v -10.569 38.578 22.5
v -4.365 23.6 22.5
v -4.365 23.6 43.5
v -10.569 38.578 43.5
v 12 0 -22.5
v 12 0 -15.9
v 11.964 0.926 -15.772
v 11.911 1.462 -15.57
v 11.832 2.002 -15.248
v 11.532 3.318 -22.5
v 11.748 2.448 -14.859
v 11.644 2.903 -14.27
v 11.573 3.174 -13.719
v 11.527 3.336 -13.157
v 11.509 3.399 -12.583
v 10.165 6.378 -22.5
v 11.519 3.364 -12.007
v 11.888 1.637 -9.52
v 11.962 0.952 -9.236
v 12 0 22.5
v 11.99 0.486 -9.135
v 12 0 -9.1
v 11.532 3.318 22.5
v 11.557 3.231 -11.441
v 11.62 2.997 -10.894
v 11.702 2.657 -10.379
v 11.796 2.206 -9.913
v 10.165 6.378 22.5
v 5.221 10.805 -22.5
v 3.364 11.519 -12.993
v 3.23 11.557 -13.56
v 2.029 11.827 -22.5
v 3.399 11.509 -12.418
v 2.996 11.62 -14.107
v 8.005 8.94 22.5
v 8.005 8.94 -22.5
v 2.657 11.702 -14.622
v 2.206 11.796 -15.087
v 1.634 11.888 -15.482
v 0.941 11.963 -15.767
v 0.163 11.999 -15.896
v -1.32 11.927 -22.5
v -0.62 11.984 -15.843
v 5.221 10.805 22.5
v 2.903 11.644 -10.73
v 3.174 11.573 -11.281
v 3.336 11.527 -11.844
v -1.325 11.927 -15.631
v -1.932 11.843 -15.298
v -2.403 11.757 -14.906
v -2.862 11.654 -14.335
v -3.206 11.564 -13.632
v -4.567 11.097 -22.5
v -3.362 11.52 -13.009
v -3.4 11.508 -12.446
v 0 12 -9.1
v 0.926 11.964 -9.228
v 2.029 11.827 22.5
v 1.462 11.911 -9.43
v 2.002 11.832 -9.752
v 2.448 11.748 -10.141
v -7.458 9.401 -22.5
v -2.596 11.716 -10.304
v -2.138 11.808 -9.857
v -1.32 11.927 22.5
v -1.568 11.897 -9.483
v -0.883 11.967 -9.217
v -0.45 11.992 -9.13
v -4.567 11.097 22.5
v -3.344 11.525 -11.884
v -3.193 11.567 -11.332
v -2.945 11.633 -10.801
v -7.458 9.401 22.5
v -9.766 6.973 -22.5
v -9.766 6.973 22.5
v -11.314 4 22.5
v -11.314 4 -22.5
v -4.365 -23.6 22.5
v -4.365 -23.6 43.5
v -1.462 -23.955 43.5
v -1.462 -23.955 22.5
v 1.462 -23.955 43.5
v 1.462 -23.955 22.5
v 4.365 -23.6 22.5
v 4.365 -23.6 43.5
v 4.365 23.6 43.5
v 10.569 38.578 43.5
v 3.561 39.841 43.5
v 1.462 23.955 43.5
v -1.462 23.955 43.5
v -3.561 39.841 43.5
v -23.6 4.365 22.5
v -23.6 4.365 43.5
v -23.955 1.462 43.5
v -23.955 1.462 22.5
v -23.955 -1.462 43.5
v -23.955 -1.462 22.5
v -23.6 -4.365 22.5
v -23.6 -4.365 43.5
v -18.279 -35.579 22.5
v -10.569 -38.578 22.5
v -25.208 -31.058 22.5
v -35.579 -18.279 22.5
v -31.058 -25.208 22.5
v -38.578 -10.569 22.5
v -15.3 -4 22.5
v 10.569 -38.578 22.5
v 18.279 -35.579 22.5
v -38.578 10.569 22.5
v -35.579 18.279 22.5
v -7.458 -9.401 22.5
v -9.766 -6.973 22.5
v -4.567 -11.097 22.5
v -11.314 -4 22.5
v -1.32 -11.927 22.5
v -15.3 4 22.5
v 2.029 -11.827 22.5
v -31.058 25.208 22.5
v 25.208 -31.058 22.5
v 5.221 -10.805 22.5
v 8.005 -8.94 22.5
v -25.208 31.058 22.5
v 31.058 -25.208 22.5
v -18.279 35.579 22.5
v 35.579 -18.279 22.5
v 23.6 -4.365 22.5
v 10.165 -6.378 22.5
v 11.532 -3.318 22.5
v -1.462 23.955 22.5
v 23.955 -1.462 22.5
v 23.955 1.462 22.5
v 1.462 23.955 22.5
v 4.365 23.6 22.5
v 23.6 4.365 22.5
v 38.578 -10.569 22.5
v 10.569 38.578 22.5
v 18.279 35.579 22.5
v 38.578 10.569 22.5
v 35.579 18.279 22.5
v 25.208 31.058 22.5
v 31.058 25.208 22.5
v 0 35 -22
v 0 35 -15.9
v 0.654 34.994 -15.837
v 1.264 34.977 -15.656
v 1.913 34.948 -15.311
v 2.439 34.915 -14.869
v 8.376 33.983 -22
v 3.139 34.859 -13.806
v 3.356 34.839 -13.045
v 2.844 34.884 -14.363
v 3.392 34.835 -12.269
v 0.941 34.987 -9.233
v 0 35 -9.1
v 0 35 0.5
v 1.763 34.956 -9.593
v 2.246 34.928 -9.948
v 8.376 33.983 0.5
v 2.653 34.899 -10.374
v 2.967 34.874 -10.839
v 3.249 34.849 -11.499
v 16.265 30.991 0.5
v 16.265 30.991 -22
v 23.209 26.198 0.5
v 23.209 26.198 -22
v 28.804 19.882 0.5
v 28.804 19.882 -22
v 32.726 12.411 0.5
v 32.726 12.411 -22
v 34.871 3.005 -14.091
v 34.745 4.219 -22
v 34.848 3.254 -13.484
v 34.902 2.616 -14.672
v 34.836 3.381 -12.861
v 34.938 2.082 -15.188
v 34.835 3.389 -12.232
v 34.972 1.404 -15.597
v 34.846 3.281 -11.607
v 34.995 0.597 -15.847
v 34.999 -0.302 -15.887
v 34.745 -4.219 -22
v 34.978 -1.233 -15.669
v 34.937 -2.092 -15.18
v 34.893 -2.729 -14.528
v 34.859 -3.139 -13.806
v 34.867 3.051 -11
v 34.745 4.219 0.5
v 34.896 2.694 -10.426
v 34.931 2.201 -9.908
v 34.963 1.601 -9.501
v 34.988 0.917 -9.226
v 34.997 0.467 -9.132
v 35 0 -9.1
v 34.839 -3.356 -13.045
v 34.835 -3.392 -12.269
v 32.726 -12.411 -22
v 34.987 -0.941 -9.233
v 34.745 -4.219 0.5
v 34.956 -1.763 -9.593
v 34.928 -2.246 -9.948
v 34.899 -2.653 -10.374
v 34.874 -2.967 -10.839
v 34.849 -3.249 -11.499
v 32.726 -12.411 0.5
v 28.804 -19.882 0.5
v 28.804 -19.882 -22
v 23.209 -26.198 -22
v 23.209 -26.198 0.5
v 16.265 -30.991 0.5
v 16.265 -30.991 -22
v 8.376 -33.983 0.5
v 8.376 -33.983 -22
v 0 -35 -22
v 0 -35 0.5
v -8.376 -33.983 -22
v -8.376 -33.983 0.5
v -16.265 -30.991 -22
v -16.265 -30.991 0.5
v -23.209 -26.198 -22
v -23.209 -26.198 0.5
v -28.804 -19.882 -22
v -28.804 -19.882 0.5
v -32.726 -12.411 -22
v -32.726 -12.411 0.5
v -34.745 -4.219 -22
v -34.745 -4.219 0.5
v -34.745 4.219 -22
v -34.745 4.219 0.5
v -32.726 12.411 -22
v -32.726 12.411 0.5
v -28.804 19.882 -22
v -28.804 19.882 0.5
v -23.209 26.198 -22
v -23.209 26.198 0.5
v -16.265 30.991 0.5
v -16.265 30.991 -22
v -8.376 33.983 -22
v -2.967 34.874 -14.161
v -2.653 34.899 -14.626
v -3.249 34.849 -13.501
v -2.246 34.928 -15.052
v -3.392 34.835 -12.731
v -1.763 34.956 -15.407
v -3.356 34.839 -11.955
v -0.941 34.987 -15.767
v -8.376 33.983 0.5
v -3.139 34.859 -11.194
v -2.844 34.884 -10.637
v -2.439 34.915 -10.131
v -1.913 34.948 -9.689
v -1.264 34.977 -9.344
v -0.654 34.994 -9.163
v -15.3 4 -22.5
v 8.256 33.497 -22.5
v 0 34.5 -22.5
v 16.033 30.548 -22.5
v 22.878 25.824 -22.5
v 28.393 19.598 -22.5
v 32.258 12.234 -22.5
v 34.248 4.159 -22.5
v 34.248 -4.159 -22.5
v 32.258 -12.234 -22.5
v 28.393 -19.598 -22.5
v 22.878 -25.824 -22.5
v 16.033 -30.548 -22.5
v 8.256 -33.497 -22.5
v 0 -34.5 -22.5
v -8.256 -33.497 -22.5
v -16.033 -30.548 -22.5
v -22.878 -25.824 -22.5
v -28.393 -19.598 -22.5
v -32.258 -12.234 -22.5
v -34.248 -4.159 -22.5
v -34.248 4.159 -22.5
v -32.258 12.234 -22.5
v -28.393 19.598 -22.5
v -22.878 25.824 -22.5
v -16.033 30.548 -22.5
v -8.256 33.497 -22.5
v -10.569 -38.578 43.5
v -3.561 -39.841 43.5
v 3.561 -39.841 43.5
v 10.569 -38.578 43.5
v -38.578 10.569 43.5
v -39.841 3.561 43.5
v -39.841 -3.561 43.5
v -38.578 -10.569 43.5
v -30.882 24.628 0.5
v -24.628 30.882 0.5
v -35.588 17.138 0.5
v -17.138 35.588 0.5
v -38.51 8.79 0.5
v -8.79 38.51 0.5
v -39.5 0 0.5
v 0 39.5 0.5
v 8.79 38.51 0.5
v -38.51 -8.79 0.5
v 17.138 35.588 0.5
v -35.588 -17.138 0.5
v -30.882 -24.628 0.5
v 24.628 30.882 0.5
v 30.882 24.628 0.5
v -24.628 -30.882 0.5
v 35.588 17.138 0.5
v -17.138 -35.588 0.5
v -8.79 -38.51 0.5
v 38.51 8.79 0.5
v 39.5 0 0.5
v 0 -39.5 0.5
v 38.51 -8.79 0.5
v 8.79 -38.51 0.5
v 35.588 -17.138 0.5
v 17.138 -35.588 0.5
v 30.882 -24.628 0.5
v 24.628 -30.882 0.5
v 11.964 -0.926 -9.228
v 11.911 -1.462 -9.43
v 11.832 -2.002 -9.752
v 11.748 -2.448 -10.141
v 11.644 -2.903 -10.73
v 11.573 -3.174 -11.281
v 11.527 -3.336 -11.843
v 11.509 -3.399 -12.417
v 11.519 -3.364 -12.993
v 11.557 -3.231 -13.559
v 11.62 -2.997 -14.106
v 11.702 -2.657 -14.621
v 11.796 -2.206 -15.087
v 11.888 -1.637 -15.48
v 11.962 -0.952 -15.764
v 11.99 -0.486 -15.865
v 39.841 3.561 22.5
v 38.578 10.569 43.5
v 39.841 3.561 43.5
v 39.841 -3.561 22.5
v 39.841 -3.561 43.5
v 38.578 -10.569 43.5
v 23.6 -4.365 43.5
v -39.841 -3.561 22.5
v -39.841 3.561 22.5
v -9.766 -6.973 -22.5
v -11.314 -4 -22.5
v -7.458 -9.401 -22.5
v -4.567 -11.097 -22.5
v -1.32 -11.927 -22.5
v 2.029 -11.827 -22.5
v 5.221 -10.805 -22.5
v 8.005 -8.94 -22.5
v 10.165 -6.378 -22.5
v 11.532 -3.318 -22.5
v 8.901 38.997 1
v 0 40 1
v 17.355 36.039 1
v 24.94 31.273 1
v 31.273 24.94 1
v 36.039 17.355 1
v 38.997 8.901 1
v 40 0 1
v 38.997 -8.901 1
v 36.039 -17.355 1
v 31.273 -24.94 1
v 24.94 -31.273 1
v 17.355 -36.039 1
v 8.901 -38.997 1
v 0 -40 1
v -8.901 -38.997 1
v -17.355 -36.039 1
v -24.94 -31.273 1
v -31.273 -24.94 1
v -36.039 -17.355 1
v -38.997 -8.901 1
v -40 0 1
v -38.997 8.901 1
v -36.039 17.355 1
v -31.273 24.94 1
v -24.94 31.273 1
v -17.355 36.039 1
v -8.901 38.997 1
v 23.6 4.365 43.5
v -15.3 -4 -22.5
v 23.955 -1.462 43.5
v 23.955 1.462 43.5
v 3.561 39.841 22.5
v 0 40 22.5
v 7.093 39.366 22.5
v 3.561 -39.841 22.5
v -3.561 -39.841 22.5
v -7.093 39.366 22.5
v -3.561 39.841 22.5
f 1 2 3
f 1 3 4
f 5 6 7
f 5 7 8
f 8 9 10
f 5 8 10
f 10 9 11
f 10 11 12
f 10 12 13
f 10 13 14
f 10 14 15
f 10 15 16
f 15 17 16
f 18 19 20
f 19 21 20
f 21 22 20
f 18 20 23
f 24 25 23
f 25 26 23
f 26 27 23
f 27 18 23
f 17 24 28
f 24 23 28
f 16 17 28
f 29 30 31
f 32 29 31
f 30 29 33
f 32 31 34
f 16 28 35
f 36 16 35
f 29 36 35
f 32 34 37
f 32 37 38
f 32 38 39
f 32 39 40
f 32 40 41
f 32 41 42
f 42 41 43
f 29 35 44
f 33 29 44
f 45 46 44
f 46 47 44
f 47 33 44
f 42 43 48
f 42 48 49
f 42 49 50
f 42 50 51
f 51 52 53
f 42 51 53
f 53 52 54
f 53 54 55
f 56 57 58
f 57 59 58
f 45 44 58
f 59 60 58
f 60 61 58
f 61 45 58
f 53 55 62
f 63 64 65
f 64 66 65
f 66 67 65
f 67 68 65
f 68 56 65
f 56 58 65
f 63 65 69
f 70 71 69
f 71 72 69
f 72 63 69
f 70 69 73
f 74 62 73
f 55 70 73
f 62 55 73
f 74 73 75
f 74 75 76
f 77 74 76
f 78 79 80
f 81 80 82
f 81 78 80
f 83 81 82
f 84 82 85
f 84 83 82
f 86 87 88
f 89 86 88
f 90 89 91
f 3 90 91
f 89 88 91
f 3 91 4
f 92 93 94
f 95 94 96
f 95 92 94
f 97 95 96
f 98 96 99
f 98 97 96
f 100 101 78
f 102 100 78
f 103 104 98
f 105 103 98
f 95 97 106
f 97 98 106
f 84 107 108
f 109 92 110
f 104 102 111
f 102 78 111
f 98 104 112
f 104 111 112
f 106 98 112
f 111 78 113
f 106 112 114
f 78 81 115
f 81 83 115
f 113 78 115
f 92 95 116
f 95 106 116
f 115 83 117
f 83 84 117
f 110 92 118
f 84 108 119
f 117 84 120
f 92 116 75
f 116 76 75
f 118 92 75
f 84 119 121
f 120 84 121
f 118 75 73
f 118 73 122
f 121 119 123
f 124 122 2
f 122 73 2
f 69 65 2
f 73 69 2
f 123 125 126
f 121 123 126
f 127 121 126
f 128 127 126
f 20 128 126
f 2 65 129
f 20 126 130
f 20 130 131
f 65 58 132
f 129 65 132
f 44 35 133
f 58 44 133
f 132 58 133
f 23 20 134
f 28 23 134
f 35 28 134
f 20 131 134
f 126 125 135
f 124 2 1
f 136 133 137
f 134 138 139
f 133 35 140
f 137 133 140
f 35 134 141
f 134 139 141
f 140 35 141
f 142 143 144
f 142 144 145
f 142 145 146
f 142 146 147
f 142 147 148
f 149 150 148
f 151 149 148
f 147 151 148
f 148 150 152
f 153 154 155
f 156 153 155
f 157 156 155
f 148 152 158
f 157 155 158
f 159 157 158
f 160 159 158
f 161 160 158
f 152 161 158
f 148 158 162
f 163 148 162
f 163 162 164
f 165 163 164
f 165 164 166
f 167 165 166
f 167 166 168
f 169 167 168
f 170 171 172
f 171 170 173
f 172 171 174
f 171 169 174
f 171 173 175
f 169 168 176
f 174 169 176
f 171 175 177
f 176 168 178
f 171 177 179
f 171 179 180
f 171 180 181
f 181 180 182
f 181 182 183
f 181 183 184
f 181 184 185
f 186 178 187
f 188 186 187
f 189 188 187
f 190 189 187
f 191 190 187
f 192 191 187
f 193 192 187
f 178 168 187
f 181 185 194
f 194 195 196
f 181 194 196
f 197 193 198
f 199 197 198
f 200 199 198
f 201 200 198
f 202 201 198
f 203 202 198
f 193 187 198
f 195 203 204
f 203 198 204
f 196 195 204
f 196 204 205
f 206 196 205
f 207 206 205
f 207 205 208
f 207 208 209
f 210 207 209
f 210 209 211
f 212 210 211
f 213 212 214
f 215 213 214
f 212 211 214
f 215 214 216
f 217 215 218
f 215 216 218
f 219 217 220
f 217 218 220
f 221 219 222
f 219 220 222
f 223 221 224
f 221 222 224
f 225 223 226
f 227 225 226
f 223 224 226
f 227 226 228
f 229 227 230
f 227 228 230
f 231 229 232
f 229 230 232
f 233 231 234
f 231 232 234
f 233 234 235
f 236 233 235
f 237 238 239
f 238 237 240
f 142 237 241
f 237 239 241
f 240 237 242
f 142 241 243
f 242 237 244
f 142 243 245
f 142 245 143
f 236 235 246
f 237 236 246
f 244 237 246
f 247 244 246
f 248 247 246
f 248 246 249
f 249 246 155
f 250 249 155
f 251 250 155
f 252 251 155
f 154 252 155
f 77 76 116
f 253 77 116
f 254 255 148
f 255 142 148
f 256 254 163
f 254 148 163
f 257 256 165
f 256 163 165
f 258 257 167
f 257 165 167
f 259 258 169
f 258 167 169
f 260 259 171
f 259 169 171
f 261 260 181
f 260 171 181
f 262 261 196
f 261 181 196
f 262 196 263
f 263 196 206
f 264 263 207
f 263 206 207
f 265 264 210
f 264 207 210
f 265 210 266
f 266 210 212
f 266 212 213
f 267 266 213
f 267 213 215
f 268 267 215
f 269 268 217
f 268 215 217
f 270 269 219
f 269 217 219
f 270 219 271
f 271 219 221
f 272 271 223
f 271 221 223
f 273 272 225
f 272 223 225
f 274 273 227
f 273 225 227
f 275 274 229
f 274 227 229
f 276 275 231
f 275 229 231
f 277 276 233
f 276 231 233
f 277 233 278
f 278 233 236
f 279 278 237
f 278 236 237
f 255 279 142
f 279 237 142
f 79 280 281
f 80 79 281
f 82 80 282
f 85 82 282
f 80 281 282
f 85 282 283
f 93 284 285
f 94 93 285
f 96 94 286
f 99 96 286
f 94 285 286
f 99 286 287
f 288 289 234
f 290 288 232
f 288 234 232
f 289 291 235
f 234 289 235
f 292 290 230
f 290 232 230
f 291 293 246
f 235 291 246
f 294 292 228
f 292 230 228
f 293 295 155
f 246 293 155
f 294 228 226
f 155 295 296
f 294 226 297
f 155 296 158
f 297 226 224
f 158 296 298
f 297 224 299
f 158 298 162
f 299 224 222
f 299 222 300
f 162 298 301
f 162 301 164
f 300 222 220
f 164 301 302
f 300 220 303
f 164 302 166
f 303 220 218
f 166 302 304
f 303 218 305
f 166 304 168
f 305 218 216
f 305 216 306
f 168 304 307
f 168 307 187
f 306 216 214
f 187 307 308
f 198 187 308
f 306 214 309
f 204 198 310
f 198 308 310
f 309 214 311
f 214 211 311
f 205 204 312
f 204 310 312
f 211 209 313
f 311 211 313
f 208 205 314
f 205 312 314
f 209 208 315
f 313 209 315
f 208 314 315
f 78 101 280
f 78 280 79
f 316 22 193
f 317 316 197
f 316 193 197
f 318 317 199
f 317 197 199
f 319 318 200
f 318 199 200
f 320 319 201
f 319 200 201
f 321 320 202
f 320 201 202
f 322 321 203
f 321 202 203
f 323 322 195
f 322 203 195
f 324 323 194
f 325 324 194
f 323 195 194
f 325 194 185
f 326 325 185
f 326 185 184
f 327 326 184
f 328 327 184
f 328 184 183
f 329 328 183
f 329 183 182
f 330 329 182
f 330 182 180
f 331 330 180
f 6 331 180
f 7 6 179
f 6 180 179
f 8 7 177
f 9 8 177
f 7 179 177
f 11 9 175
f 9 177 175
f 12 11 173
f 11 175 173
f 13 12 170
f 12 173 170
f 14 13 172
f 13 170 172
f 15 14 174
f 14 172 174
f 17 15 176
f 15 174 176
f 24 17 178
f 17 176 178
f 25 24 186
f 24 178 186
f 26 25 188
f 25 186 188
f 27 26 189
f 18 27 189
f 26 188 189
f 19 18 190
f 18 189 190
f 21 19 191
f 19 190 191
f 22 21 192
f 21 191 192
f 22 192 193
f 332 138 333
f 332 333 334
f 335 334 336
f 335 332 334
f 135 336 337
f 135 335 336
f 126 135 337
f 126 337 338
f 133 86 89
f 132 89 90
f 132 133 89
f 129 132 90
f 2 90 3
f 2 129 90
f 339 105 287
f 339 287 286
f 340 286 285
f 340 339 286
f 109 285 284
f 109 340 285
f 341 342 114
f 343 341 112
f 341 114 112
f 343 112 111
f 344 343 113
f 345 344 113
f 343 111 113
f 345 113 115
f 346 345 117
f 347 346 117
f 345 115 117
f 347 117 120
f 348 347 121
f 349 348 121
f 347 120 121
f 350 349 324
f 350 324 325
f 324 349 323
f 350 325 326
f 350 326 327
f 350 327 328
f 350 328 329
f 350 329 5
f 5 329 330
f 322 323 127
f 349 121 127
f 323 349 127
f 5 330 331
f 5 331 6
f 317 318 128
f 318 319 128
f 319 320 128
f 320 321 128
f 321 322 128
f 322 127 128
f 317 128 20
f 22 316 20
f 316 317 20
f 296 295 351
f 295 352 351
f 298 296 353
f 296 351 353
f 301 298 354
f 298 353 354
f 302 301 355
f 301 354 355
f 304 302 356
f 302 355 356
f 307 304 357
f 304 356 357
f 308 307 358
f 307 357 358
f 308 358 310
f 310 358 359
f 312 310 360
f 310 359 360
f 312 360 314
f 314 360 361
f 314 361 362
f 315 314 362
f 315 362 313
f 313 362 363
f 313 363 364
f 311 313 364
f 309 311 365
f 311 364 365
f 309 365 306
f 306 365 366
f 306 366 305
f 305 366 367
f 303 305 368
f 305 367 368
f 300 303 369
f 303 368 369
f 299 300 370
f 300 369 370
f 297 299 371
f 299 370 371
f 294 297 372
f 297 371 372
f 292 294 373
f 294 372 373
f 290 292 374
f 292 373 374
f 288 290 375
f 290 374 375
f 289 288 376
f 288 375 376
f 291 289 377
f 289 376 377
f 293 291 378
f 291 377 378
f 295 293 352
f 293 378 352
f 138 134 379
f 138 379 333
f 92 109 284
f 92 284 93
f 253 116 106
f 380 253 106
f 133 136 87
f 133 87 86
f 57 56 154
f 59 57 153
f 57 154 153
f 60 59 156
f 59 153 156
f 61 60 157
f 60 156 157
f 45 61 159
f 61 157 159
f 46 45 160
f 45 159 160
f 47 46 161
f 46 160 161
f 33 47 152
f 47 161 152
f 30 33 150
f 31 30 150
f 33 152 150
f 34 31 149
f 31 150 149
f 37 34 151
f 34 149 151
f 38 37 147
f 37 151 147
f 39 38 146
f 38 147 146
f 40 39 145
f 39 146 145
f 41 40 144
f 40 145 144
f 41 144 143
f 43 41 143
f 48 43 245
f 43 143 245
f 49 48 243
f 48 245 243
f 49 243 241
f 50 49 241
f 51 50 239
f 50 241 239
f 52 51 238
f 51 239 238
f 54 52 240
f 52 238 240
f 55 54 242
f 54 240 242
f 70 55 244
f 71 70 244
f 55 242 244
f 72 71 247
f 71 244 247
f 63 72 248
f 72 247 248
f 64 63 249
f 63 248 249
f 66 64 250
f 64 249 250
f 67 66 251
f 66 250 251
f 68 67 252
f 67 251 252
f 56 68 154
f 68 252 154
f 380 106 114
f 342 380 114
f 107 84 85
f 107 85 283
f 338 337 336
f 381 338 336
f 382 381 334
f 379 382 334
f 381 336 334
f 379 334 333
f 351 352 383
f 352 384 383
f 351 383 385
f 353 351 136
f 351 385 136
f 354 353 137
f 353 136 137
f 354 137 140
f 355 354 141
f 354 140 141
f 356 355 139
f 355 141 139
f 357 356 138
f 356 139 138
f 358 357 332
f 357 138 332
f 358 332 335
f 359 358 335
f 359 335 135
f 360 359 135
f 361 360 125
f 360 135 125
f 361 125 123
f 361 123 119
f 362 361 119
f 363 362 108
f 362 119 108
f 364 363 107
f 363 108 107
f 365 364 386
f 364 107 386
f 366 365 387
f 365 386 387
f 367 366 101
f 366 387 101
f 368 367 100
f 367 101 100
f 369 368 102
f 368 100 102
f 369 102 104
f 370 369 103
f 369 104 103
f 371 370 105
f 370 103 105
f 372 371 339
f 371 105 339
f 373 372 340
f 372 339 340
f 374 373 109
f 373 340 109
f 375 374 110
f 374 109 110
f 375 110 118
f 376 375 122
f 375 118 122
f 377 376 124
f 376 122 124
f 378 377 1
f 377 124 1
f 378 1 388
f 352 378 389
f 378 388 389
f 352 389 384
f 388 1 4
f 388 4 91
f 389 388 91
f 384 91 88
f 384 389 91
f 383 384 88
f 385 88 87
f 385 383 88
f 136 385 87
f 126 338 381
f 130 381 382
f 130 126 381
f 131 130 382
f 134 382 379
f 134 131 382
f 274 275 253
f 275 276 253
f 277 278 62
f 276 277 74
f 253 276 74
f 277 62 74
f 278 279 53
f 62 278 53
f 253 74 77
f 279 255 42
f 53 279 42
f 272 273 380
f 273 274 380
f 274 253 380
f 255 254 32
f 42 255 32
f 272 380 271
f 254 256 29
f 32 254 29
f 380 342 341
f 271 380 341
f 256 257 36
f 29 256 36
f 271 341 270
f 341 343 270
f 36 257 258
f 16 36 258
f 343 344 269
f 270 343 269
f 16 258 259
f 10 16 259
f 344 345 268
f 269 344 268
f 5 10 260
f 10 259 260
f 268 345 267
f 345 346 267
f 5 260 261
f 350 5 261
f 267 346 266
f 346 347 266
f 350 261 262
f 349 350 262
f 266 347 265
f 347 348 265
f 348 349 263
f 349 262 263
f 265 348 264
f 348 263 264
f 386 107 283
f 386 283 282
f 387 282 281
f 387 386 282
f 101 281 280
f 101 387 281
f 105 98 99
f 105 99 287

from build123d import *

# Parameters (mm, degrees)
BOSS_EXTRUDE1_DEPTH = 21
CIRPATTERN1_COUNT   = 4
CUT_EXTRUDE2_DEPTH  = 46
SKETCH12_W          = 3.4
SKETCH12_H          = 35
CIRPATTERN2_COUNT   = 2
CIRPATTERN2_ANGLE   = 90


with BuildPart() as part:
    # Sketch3 → Revolve2 (revolve)
    with BuildSketch(Plane(origin=(0, 0, 0), x_dir=(0, 0, -1), z_dir=(1, 0, 0))):
        Polygon((22.5, 0), (22.5, 34.5), (22, 35), (-0.5, 35), (-0.5, 39.5), (-1, 40), (-22.5, 40), (-22.5, 0), align=None)
    revolve(axis=Axis((0, 0, 22.5), (0, 0, -1)))

    # Sketch5 → Boss-Extrude1 (add)
    with BuildSketch(Plane.XY.offset(22.5)):
        with BuildLine():
            Line((-4.365, 23.59972), (-10.56935, 38.578347))
            ThreePointArc((-10.56935, 38.578347), (0, 40), (10.56935, 38.578347))
            Line((10.56935, 38.578347), (4.365, 23.59972))
            ThreePointArc((4.365, 23.59972), (0, 24), (-4.365, 23.59972))
        make_face()
    boss_extrude1 = extrude(amount=BOSS_EXTRUDE1_DEPTH)

    # CirPattern1: Boss-Extrude1 ×4 about axis
    cirpattern1_axis = Axis((0, 0, 0), (0, 0, 1))
    for i in range(1, CIRPATTERN1_COUNT):
        add(boss_extrude1.rotate(cirpattern1_axis, i * 360 / CIRPATTERN1_COUNT))

    # Sketch6 → Cut-Extrude2 (cut, through all)
    with BuildSketch(Plane.XY.offset(22.5)):
        with BuildLine():
            ThreePointArc((12, 0), (2.029224, 11.827183), (-11.313708, 4))
            Line((-11.313708, 4), (-8.7, 4))
            Line((-8.7, 4), (-8.7, -4))
            Line((-8.7, -4), (-11.313708, -4))
            ThreePointArc((-11.313708, -4), (2.029224, -11.827183), (12, 0))
        make_face()
        with BuildLine():
            Line((-8.7, 4), (-11.313708, 4))
            ThreePointArc((-11.313708, 4), (-12, 0), (-11.313708, -4))
            Line((-11.313708, -4), (-8.7, -4))
            Line((-8.7, -4), (-8.7, 4))
        make_face()
        with BuildLine():
            Line((-11.313708, 4), (-15.3, 4))
            Line((-15.3, 4), (-15.3, -4))
            Line((-15.3, -4), (-11.313708, -4))
            ThreePointArc((-11.313708, -4), (-12, 0), (-11.313708, 4))
        make_face()
    extrude(amount=-CUT_EXTRUDE2_DEPTH, mode=Mode.SUBTRACT)

    # Sketch12 → Tap Drill for M8x1.25 Tap2 (revolve, cut)
    with BuildSketch(Plane(origin=(0, 0, -12.5), x_dir=(0, 0, 1), z_dir=(0, 1, 0))):
        with Locations((1.7, 17.5)):
            Rectangle(SKETCH12_W, SKETCH12_H)
    tap_drill_for_m8x1_25_tap2 = revolve(axis=Axis((-6.35, 0, -12.5), (1, 0, 0)), mode=Mode.SUBTRACT)

    # CirPattern2: Tap Drill for M8x1.25 Tap2 ×2 about axis
    cirpattern2_axis = Axis((0, 0, 22.5), (0, 0, 1))
    for i in range(1, CIRPATTERN2_COUNT):
        add(tap_drill_for_m8x1_25_tap2.rotate(cirpattern2_axis, i * CIRPATTERN2_ANGLE / (CIRPATTERN2_COUNT - 1)), mode=Mode.SUBTRACT)


solid = part.part
